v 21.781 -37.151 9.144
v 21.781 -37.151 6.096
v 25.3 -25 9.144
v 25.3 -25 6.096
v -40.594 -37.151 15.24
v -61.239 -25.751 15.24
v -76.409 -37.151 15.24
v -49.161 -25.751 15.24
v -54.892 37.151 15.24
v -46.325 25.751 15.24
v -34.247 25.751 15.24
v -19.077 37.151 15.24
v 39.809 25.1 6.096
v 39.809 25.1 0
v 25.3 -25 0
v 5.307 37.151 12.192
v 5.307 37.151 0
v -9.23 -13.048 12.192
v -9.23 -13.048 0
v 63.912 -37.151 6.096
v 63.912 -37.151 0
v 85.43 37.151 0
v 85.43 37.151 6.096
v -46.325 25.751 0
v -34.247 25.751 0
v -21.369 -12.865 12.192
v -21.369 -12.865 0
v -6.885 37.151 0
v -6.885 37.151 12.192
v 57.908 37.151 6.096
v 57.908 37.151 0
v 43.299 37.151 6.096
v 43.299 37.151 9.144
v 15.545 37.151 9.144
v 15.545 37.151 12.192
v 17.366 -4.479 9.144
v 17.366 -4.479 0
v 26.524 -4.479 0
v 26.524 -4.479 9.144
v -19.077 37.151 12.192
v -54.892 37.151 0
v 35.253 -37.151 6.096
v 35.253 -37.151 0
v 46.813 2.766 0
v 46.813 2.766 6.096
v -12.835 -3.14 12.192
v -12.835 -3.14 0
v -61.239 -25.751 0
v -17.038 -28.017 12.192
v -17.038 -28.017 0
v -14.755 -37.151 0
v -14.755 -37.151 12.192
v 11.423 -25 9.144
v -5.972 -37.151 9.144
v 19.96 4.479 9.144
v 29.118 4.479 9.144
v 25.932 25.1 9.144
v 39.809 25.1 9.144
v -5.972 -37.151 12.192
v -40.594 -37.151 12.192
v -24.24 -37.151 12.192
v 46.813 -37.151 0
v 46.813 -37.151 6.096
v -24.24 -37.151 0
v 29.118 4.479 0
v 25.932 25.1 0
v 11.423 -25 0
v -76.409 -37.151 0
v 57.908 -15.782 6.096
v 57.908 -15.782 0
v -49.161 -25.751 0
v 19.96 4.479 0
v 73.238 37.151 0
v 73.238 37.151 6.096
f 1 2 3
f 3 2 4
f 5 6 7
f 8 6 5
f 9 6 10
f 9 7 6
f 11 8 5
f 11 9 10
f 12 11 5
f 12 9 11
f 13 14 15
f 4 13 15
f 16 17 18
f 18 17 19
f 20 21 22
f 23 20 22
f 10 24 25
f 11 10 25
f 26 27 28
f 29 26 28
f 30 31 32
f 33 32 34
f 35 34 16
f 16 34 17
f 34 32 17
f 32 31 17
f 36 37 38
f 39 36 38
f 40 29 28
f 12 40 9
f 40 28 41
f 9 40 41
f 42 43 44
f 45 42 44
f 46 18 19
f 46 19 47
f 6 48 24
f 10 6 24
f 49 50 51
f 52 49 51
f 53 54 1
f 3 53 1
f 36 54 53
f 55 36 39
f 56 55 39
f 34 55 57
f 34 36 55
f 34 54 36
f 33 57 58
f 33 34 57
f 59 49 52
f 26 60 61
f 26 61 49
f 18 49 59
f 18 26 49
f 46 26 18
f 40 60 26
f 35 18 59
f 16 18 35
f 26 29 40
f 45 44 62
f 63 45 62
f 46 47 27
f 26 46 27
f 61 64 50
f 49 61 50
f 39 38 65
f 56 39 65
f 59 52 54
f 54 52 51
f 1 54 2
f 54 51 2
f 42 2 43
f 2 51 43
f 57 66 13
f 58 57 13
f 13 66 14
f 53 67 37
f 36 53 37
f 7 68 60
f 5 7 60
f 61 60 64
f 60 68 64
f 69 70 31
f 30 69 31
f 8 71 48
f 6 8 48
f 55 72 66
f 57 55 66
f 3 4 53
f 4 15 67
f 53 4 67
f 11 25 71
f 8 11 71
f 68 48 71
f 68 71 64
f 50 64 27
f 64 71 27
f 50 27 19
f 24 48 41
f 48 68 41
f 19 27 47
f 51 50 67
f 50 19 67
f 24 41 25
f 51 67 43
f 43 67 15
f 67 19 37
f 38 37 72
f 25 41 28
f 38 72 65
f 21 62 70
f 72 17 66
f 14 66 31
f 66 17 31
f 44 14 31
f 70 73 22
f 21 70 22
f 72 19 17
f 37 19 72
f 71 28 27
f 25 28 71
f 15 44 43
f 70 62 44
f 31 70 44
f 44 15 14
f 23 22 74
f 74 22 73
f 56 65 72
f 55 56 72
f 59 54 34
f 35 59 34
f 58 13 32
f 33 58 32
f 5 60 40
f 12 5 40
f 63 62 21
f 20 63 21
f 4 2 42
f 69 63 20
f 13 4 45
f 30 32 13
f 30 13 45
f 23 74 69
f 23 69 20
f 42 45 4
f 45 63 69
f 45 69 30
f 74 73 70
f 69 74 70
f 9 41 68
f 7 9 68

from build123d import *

# Parameters (mm, degrees)
F1_DEPTH = 15.24
F2_DEPTH = 12.192
F3_DEPTH = 9.144
F4_DEPTH = 6.096


with BuildPart() as f1:
    # F0 (on Top) → F1 (new body)
    with BuildSketch(Plane.XY):
        Polygon((-19.076721, 37.150636), (-54.891605, 37.150636), (-76.409116, -37.150636), (-40.594233, -37.150636), align=None)
        Polygon((-61.239227, -25.750598), (-46.324576, 25.750598), (-34.24661, 25.750598), (-49.161262, -25.750598), align=None, mode=Mode.SUBTRACT)
    extrude(amount=F1_DEPTH)

    # F0 (on Top) → F2 (join)
    with BuildSketch(Plane.XY):
        Polygon((-6.884721, 37.150636), (-19.076721, 37.150636), (-40.594233, -37.150636), (-24.240132, -37.150636), (-17.038353, -28.016673), (-14.754863, -37.150636), (-5.972206, -37.150636), (15.545306, 37.150636), (5.307279, 37.150636), (-9.230042, -13.047613), (-12.835056, -3.14023), (-21.369147, -12.864963), align=None)
    extrude(amount=F2_DEPTH)

    # F0 (on Top) → F3 (join)
    with BuildSketch(Plane.XY):
        Polygon((43.298501, 37.150636), (15.545306, 37.150636), (-5.972206, -37.150636), (21.78099, -37.150636), (25.299825, -24.999883), (11.423228, -24.999883), (17.365993, -4.479155), (26.523624, -4.479155), (29.117934, 4.479155), (26.523624, 4.479155), (19.960303, 4.479155), (25.932101, 25.100136), (39.808699, 25.100136), align=None)
    extrude(amount=F3_DEPTH)

    # F0 (on Top) → F4 (join)
    with BuildSketch(Plane.XY):
        Polygon((57.90846, 37.150636), (43.298501, 37.150636), (39.808699, 25.100136), (25.299825, -24.999883), (21.78099, -37.150636), (35.253152, -37.150636), (46.813049, 2.766387), (46.813049, -7.282906), (46.813049, -37.150636), (49.582697, -37.150636), (63.912243, -37.150636), (85.429754, 37.150636), (73.237754, 37.150636), (57.90846, -15.782347), align=None)
    extrude(amount=F4_DEPTH)


solid = f1.part
